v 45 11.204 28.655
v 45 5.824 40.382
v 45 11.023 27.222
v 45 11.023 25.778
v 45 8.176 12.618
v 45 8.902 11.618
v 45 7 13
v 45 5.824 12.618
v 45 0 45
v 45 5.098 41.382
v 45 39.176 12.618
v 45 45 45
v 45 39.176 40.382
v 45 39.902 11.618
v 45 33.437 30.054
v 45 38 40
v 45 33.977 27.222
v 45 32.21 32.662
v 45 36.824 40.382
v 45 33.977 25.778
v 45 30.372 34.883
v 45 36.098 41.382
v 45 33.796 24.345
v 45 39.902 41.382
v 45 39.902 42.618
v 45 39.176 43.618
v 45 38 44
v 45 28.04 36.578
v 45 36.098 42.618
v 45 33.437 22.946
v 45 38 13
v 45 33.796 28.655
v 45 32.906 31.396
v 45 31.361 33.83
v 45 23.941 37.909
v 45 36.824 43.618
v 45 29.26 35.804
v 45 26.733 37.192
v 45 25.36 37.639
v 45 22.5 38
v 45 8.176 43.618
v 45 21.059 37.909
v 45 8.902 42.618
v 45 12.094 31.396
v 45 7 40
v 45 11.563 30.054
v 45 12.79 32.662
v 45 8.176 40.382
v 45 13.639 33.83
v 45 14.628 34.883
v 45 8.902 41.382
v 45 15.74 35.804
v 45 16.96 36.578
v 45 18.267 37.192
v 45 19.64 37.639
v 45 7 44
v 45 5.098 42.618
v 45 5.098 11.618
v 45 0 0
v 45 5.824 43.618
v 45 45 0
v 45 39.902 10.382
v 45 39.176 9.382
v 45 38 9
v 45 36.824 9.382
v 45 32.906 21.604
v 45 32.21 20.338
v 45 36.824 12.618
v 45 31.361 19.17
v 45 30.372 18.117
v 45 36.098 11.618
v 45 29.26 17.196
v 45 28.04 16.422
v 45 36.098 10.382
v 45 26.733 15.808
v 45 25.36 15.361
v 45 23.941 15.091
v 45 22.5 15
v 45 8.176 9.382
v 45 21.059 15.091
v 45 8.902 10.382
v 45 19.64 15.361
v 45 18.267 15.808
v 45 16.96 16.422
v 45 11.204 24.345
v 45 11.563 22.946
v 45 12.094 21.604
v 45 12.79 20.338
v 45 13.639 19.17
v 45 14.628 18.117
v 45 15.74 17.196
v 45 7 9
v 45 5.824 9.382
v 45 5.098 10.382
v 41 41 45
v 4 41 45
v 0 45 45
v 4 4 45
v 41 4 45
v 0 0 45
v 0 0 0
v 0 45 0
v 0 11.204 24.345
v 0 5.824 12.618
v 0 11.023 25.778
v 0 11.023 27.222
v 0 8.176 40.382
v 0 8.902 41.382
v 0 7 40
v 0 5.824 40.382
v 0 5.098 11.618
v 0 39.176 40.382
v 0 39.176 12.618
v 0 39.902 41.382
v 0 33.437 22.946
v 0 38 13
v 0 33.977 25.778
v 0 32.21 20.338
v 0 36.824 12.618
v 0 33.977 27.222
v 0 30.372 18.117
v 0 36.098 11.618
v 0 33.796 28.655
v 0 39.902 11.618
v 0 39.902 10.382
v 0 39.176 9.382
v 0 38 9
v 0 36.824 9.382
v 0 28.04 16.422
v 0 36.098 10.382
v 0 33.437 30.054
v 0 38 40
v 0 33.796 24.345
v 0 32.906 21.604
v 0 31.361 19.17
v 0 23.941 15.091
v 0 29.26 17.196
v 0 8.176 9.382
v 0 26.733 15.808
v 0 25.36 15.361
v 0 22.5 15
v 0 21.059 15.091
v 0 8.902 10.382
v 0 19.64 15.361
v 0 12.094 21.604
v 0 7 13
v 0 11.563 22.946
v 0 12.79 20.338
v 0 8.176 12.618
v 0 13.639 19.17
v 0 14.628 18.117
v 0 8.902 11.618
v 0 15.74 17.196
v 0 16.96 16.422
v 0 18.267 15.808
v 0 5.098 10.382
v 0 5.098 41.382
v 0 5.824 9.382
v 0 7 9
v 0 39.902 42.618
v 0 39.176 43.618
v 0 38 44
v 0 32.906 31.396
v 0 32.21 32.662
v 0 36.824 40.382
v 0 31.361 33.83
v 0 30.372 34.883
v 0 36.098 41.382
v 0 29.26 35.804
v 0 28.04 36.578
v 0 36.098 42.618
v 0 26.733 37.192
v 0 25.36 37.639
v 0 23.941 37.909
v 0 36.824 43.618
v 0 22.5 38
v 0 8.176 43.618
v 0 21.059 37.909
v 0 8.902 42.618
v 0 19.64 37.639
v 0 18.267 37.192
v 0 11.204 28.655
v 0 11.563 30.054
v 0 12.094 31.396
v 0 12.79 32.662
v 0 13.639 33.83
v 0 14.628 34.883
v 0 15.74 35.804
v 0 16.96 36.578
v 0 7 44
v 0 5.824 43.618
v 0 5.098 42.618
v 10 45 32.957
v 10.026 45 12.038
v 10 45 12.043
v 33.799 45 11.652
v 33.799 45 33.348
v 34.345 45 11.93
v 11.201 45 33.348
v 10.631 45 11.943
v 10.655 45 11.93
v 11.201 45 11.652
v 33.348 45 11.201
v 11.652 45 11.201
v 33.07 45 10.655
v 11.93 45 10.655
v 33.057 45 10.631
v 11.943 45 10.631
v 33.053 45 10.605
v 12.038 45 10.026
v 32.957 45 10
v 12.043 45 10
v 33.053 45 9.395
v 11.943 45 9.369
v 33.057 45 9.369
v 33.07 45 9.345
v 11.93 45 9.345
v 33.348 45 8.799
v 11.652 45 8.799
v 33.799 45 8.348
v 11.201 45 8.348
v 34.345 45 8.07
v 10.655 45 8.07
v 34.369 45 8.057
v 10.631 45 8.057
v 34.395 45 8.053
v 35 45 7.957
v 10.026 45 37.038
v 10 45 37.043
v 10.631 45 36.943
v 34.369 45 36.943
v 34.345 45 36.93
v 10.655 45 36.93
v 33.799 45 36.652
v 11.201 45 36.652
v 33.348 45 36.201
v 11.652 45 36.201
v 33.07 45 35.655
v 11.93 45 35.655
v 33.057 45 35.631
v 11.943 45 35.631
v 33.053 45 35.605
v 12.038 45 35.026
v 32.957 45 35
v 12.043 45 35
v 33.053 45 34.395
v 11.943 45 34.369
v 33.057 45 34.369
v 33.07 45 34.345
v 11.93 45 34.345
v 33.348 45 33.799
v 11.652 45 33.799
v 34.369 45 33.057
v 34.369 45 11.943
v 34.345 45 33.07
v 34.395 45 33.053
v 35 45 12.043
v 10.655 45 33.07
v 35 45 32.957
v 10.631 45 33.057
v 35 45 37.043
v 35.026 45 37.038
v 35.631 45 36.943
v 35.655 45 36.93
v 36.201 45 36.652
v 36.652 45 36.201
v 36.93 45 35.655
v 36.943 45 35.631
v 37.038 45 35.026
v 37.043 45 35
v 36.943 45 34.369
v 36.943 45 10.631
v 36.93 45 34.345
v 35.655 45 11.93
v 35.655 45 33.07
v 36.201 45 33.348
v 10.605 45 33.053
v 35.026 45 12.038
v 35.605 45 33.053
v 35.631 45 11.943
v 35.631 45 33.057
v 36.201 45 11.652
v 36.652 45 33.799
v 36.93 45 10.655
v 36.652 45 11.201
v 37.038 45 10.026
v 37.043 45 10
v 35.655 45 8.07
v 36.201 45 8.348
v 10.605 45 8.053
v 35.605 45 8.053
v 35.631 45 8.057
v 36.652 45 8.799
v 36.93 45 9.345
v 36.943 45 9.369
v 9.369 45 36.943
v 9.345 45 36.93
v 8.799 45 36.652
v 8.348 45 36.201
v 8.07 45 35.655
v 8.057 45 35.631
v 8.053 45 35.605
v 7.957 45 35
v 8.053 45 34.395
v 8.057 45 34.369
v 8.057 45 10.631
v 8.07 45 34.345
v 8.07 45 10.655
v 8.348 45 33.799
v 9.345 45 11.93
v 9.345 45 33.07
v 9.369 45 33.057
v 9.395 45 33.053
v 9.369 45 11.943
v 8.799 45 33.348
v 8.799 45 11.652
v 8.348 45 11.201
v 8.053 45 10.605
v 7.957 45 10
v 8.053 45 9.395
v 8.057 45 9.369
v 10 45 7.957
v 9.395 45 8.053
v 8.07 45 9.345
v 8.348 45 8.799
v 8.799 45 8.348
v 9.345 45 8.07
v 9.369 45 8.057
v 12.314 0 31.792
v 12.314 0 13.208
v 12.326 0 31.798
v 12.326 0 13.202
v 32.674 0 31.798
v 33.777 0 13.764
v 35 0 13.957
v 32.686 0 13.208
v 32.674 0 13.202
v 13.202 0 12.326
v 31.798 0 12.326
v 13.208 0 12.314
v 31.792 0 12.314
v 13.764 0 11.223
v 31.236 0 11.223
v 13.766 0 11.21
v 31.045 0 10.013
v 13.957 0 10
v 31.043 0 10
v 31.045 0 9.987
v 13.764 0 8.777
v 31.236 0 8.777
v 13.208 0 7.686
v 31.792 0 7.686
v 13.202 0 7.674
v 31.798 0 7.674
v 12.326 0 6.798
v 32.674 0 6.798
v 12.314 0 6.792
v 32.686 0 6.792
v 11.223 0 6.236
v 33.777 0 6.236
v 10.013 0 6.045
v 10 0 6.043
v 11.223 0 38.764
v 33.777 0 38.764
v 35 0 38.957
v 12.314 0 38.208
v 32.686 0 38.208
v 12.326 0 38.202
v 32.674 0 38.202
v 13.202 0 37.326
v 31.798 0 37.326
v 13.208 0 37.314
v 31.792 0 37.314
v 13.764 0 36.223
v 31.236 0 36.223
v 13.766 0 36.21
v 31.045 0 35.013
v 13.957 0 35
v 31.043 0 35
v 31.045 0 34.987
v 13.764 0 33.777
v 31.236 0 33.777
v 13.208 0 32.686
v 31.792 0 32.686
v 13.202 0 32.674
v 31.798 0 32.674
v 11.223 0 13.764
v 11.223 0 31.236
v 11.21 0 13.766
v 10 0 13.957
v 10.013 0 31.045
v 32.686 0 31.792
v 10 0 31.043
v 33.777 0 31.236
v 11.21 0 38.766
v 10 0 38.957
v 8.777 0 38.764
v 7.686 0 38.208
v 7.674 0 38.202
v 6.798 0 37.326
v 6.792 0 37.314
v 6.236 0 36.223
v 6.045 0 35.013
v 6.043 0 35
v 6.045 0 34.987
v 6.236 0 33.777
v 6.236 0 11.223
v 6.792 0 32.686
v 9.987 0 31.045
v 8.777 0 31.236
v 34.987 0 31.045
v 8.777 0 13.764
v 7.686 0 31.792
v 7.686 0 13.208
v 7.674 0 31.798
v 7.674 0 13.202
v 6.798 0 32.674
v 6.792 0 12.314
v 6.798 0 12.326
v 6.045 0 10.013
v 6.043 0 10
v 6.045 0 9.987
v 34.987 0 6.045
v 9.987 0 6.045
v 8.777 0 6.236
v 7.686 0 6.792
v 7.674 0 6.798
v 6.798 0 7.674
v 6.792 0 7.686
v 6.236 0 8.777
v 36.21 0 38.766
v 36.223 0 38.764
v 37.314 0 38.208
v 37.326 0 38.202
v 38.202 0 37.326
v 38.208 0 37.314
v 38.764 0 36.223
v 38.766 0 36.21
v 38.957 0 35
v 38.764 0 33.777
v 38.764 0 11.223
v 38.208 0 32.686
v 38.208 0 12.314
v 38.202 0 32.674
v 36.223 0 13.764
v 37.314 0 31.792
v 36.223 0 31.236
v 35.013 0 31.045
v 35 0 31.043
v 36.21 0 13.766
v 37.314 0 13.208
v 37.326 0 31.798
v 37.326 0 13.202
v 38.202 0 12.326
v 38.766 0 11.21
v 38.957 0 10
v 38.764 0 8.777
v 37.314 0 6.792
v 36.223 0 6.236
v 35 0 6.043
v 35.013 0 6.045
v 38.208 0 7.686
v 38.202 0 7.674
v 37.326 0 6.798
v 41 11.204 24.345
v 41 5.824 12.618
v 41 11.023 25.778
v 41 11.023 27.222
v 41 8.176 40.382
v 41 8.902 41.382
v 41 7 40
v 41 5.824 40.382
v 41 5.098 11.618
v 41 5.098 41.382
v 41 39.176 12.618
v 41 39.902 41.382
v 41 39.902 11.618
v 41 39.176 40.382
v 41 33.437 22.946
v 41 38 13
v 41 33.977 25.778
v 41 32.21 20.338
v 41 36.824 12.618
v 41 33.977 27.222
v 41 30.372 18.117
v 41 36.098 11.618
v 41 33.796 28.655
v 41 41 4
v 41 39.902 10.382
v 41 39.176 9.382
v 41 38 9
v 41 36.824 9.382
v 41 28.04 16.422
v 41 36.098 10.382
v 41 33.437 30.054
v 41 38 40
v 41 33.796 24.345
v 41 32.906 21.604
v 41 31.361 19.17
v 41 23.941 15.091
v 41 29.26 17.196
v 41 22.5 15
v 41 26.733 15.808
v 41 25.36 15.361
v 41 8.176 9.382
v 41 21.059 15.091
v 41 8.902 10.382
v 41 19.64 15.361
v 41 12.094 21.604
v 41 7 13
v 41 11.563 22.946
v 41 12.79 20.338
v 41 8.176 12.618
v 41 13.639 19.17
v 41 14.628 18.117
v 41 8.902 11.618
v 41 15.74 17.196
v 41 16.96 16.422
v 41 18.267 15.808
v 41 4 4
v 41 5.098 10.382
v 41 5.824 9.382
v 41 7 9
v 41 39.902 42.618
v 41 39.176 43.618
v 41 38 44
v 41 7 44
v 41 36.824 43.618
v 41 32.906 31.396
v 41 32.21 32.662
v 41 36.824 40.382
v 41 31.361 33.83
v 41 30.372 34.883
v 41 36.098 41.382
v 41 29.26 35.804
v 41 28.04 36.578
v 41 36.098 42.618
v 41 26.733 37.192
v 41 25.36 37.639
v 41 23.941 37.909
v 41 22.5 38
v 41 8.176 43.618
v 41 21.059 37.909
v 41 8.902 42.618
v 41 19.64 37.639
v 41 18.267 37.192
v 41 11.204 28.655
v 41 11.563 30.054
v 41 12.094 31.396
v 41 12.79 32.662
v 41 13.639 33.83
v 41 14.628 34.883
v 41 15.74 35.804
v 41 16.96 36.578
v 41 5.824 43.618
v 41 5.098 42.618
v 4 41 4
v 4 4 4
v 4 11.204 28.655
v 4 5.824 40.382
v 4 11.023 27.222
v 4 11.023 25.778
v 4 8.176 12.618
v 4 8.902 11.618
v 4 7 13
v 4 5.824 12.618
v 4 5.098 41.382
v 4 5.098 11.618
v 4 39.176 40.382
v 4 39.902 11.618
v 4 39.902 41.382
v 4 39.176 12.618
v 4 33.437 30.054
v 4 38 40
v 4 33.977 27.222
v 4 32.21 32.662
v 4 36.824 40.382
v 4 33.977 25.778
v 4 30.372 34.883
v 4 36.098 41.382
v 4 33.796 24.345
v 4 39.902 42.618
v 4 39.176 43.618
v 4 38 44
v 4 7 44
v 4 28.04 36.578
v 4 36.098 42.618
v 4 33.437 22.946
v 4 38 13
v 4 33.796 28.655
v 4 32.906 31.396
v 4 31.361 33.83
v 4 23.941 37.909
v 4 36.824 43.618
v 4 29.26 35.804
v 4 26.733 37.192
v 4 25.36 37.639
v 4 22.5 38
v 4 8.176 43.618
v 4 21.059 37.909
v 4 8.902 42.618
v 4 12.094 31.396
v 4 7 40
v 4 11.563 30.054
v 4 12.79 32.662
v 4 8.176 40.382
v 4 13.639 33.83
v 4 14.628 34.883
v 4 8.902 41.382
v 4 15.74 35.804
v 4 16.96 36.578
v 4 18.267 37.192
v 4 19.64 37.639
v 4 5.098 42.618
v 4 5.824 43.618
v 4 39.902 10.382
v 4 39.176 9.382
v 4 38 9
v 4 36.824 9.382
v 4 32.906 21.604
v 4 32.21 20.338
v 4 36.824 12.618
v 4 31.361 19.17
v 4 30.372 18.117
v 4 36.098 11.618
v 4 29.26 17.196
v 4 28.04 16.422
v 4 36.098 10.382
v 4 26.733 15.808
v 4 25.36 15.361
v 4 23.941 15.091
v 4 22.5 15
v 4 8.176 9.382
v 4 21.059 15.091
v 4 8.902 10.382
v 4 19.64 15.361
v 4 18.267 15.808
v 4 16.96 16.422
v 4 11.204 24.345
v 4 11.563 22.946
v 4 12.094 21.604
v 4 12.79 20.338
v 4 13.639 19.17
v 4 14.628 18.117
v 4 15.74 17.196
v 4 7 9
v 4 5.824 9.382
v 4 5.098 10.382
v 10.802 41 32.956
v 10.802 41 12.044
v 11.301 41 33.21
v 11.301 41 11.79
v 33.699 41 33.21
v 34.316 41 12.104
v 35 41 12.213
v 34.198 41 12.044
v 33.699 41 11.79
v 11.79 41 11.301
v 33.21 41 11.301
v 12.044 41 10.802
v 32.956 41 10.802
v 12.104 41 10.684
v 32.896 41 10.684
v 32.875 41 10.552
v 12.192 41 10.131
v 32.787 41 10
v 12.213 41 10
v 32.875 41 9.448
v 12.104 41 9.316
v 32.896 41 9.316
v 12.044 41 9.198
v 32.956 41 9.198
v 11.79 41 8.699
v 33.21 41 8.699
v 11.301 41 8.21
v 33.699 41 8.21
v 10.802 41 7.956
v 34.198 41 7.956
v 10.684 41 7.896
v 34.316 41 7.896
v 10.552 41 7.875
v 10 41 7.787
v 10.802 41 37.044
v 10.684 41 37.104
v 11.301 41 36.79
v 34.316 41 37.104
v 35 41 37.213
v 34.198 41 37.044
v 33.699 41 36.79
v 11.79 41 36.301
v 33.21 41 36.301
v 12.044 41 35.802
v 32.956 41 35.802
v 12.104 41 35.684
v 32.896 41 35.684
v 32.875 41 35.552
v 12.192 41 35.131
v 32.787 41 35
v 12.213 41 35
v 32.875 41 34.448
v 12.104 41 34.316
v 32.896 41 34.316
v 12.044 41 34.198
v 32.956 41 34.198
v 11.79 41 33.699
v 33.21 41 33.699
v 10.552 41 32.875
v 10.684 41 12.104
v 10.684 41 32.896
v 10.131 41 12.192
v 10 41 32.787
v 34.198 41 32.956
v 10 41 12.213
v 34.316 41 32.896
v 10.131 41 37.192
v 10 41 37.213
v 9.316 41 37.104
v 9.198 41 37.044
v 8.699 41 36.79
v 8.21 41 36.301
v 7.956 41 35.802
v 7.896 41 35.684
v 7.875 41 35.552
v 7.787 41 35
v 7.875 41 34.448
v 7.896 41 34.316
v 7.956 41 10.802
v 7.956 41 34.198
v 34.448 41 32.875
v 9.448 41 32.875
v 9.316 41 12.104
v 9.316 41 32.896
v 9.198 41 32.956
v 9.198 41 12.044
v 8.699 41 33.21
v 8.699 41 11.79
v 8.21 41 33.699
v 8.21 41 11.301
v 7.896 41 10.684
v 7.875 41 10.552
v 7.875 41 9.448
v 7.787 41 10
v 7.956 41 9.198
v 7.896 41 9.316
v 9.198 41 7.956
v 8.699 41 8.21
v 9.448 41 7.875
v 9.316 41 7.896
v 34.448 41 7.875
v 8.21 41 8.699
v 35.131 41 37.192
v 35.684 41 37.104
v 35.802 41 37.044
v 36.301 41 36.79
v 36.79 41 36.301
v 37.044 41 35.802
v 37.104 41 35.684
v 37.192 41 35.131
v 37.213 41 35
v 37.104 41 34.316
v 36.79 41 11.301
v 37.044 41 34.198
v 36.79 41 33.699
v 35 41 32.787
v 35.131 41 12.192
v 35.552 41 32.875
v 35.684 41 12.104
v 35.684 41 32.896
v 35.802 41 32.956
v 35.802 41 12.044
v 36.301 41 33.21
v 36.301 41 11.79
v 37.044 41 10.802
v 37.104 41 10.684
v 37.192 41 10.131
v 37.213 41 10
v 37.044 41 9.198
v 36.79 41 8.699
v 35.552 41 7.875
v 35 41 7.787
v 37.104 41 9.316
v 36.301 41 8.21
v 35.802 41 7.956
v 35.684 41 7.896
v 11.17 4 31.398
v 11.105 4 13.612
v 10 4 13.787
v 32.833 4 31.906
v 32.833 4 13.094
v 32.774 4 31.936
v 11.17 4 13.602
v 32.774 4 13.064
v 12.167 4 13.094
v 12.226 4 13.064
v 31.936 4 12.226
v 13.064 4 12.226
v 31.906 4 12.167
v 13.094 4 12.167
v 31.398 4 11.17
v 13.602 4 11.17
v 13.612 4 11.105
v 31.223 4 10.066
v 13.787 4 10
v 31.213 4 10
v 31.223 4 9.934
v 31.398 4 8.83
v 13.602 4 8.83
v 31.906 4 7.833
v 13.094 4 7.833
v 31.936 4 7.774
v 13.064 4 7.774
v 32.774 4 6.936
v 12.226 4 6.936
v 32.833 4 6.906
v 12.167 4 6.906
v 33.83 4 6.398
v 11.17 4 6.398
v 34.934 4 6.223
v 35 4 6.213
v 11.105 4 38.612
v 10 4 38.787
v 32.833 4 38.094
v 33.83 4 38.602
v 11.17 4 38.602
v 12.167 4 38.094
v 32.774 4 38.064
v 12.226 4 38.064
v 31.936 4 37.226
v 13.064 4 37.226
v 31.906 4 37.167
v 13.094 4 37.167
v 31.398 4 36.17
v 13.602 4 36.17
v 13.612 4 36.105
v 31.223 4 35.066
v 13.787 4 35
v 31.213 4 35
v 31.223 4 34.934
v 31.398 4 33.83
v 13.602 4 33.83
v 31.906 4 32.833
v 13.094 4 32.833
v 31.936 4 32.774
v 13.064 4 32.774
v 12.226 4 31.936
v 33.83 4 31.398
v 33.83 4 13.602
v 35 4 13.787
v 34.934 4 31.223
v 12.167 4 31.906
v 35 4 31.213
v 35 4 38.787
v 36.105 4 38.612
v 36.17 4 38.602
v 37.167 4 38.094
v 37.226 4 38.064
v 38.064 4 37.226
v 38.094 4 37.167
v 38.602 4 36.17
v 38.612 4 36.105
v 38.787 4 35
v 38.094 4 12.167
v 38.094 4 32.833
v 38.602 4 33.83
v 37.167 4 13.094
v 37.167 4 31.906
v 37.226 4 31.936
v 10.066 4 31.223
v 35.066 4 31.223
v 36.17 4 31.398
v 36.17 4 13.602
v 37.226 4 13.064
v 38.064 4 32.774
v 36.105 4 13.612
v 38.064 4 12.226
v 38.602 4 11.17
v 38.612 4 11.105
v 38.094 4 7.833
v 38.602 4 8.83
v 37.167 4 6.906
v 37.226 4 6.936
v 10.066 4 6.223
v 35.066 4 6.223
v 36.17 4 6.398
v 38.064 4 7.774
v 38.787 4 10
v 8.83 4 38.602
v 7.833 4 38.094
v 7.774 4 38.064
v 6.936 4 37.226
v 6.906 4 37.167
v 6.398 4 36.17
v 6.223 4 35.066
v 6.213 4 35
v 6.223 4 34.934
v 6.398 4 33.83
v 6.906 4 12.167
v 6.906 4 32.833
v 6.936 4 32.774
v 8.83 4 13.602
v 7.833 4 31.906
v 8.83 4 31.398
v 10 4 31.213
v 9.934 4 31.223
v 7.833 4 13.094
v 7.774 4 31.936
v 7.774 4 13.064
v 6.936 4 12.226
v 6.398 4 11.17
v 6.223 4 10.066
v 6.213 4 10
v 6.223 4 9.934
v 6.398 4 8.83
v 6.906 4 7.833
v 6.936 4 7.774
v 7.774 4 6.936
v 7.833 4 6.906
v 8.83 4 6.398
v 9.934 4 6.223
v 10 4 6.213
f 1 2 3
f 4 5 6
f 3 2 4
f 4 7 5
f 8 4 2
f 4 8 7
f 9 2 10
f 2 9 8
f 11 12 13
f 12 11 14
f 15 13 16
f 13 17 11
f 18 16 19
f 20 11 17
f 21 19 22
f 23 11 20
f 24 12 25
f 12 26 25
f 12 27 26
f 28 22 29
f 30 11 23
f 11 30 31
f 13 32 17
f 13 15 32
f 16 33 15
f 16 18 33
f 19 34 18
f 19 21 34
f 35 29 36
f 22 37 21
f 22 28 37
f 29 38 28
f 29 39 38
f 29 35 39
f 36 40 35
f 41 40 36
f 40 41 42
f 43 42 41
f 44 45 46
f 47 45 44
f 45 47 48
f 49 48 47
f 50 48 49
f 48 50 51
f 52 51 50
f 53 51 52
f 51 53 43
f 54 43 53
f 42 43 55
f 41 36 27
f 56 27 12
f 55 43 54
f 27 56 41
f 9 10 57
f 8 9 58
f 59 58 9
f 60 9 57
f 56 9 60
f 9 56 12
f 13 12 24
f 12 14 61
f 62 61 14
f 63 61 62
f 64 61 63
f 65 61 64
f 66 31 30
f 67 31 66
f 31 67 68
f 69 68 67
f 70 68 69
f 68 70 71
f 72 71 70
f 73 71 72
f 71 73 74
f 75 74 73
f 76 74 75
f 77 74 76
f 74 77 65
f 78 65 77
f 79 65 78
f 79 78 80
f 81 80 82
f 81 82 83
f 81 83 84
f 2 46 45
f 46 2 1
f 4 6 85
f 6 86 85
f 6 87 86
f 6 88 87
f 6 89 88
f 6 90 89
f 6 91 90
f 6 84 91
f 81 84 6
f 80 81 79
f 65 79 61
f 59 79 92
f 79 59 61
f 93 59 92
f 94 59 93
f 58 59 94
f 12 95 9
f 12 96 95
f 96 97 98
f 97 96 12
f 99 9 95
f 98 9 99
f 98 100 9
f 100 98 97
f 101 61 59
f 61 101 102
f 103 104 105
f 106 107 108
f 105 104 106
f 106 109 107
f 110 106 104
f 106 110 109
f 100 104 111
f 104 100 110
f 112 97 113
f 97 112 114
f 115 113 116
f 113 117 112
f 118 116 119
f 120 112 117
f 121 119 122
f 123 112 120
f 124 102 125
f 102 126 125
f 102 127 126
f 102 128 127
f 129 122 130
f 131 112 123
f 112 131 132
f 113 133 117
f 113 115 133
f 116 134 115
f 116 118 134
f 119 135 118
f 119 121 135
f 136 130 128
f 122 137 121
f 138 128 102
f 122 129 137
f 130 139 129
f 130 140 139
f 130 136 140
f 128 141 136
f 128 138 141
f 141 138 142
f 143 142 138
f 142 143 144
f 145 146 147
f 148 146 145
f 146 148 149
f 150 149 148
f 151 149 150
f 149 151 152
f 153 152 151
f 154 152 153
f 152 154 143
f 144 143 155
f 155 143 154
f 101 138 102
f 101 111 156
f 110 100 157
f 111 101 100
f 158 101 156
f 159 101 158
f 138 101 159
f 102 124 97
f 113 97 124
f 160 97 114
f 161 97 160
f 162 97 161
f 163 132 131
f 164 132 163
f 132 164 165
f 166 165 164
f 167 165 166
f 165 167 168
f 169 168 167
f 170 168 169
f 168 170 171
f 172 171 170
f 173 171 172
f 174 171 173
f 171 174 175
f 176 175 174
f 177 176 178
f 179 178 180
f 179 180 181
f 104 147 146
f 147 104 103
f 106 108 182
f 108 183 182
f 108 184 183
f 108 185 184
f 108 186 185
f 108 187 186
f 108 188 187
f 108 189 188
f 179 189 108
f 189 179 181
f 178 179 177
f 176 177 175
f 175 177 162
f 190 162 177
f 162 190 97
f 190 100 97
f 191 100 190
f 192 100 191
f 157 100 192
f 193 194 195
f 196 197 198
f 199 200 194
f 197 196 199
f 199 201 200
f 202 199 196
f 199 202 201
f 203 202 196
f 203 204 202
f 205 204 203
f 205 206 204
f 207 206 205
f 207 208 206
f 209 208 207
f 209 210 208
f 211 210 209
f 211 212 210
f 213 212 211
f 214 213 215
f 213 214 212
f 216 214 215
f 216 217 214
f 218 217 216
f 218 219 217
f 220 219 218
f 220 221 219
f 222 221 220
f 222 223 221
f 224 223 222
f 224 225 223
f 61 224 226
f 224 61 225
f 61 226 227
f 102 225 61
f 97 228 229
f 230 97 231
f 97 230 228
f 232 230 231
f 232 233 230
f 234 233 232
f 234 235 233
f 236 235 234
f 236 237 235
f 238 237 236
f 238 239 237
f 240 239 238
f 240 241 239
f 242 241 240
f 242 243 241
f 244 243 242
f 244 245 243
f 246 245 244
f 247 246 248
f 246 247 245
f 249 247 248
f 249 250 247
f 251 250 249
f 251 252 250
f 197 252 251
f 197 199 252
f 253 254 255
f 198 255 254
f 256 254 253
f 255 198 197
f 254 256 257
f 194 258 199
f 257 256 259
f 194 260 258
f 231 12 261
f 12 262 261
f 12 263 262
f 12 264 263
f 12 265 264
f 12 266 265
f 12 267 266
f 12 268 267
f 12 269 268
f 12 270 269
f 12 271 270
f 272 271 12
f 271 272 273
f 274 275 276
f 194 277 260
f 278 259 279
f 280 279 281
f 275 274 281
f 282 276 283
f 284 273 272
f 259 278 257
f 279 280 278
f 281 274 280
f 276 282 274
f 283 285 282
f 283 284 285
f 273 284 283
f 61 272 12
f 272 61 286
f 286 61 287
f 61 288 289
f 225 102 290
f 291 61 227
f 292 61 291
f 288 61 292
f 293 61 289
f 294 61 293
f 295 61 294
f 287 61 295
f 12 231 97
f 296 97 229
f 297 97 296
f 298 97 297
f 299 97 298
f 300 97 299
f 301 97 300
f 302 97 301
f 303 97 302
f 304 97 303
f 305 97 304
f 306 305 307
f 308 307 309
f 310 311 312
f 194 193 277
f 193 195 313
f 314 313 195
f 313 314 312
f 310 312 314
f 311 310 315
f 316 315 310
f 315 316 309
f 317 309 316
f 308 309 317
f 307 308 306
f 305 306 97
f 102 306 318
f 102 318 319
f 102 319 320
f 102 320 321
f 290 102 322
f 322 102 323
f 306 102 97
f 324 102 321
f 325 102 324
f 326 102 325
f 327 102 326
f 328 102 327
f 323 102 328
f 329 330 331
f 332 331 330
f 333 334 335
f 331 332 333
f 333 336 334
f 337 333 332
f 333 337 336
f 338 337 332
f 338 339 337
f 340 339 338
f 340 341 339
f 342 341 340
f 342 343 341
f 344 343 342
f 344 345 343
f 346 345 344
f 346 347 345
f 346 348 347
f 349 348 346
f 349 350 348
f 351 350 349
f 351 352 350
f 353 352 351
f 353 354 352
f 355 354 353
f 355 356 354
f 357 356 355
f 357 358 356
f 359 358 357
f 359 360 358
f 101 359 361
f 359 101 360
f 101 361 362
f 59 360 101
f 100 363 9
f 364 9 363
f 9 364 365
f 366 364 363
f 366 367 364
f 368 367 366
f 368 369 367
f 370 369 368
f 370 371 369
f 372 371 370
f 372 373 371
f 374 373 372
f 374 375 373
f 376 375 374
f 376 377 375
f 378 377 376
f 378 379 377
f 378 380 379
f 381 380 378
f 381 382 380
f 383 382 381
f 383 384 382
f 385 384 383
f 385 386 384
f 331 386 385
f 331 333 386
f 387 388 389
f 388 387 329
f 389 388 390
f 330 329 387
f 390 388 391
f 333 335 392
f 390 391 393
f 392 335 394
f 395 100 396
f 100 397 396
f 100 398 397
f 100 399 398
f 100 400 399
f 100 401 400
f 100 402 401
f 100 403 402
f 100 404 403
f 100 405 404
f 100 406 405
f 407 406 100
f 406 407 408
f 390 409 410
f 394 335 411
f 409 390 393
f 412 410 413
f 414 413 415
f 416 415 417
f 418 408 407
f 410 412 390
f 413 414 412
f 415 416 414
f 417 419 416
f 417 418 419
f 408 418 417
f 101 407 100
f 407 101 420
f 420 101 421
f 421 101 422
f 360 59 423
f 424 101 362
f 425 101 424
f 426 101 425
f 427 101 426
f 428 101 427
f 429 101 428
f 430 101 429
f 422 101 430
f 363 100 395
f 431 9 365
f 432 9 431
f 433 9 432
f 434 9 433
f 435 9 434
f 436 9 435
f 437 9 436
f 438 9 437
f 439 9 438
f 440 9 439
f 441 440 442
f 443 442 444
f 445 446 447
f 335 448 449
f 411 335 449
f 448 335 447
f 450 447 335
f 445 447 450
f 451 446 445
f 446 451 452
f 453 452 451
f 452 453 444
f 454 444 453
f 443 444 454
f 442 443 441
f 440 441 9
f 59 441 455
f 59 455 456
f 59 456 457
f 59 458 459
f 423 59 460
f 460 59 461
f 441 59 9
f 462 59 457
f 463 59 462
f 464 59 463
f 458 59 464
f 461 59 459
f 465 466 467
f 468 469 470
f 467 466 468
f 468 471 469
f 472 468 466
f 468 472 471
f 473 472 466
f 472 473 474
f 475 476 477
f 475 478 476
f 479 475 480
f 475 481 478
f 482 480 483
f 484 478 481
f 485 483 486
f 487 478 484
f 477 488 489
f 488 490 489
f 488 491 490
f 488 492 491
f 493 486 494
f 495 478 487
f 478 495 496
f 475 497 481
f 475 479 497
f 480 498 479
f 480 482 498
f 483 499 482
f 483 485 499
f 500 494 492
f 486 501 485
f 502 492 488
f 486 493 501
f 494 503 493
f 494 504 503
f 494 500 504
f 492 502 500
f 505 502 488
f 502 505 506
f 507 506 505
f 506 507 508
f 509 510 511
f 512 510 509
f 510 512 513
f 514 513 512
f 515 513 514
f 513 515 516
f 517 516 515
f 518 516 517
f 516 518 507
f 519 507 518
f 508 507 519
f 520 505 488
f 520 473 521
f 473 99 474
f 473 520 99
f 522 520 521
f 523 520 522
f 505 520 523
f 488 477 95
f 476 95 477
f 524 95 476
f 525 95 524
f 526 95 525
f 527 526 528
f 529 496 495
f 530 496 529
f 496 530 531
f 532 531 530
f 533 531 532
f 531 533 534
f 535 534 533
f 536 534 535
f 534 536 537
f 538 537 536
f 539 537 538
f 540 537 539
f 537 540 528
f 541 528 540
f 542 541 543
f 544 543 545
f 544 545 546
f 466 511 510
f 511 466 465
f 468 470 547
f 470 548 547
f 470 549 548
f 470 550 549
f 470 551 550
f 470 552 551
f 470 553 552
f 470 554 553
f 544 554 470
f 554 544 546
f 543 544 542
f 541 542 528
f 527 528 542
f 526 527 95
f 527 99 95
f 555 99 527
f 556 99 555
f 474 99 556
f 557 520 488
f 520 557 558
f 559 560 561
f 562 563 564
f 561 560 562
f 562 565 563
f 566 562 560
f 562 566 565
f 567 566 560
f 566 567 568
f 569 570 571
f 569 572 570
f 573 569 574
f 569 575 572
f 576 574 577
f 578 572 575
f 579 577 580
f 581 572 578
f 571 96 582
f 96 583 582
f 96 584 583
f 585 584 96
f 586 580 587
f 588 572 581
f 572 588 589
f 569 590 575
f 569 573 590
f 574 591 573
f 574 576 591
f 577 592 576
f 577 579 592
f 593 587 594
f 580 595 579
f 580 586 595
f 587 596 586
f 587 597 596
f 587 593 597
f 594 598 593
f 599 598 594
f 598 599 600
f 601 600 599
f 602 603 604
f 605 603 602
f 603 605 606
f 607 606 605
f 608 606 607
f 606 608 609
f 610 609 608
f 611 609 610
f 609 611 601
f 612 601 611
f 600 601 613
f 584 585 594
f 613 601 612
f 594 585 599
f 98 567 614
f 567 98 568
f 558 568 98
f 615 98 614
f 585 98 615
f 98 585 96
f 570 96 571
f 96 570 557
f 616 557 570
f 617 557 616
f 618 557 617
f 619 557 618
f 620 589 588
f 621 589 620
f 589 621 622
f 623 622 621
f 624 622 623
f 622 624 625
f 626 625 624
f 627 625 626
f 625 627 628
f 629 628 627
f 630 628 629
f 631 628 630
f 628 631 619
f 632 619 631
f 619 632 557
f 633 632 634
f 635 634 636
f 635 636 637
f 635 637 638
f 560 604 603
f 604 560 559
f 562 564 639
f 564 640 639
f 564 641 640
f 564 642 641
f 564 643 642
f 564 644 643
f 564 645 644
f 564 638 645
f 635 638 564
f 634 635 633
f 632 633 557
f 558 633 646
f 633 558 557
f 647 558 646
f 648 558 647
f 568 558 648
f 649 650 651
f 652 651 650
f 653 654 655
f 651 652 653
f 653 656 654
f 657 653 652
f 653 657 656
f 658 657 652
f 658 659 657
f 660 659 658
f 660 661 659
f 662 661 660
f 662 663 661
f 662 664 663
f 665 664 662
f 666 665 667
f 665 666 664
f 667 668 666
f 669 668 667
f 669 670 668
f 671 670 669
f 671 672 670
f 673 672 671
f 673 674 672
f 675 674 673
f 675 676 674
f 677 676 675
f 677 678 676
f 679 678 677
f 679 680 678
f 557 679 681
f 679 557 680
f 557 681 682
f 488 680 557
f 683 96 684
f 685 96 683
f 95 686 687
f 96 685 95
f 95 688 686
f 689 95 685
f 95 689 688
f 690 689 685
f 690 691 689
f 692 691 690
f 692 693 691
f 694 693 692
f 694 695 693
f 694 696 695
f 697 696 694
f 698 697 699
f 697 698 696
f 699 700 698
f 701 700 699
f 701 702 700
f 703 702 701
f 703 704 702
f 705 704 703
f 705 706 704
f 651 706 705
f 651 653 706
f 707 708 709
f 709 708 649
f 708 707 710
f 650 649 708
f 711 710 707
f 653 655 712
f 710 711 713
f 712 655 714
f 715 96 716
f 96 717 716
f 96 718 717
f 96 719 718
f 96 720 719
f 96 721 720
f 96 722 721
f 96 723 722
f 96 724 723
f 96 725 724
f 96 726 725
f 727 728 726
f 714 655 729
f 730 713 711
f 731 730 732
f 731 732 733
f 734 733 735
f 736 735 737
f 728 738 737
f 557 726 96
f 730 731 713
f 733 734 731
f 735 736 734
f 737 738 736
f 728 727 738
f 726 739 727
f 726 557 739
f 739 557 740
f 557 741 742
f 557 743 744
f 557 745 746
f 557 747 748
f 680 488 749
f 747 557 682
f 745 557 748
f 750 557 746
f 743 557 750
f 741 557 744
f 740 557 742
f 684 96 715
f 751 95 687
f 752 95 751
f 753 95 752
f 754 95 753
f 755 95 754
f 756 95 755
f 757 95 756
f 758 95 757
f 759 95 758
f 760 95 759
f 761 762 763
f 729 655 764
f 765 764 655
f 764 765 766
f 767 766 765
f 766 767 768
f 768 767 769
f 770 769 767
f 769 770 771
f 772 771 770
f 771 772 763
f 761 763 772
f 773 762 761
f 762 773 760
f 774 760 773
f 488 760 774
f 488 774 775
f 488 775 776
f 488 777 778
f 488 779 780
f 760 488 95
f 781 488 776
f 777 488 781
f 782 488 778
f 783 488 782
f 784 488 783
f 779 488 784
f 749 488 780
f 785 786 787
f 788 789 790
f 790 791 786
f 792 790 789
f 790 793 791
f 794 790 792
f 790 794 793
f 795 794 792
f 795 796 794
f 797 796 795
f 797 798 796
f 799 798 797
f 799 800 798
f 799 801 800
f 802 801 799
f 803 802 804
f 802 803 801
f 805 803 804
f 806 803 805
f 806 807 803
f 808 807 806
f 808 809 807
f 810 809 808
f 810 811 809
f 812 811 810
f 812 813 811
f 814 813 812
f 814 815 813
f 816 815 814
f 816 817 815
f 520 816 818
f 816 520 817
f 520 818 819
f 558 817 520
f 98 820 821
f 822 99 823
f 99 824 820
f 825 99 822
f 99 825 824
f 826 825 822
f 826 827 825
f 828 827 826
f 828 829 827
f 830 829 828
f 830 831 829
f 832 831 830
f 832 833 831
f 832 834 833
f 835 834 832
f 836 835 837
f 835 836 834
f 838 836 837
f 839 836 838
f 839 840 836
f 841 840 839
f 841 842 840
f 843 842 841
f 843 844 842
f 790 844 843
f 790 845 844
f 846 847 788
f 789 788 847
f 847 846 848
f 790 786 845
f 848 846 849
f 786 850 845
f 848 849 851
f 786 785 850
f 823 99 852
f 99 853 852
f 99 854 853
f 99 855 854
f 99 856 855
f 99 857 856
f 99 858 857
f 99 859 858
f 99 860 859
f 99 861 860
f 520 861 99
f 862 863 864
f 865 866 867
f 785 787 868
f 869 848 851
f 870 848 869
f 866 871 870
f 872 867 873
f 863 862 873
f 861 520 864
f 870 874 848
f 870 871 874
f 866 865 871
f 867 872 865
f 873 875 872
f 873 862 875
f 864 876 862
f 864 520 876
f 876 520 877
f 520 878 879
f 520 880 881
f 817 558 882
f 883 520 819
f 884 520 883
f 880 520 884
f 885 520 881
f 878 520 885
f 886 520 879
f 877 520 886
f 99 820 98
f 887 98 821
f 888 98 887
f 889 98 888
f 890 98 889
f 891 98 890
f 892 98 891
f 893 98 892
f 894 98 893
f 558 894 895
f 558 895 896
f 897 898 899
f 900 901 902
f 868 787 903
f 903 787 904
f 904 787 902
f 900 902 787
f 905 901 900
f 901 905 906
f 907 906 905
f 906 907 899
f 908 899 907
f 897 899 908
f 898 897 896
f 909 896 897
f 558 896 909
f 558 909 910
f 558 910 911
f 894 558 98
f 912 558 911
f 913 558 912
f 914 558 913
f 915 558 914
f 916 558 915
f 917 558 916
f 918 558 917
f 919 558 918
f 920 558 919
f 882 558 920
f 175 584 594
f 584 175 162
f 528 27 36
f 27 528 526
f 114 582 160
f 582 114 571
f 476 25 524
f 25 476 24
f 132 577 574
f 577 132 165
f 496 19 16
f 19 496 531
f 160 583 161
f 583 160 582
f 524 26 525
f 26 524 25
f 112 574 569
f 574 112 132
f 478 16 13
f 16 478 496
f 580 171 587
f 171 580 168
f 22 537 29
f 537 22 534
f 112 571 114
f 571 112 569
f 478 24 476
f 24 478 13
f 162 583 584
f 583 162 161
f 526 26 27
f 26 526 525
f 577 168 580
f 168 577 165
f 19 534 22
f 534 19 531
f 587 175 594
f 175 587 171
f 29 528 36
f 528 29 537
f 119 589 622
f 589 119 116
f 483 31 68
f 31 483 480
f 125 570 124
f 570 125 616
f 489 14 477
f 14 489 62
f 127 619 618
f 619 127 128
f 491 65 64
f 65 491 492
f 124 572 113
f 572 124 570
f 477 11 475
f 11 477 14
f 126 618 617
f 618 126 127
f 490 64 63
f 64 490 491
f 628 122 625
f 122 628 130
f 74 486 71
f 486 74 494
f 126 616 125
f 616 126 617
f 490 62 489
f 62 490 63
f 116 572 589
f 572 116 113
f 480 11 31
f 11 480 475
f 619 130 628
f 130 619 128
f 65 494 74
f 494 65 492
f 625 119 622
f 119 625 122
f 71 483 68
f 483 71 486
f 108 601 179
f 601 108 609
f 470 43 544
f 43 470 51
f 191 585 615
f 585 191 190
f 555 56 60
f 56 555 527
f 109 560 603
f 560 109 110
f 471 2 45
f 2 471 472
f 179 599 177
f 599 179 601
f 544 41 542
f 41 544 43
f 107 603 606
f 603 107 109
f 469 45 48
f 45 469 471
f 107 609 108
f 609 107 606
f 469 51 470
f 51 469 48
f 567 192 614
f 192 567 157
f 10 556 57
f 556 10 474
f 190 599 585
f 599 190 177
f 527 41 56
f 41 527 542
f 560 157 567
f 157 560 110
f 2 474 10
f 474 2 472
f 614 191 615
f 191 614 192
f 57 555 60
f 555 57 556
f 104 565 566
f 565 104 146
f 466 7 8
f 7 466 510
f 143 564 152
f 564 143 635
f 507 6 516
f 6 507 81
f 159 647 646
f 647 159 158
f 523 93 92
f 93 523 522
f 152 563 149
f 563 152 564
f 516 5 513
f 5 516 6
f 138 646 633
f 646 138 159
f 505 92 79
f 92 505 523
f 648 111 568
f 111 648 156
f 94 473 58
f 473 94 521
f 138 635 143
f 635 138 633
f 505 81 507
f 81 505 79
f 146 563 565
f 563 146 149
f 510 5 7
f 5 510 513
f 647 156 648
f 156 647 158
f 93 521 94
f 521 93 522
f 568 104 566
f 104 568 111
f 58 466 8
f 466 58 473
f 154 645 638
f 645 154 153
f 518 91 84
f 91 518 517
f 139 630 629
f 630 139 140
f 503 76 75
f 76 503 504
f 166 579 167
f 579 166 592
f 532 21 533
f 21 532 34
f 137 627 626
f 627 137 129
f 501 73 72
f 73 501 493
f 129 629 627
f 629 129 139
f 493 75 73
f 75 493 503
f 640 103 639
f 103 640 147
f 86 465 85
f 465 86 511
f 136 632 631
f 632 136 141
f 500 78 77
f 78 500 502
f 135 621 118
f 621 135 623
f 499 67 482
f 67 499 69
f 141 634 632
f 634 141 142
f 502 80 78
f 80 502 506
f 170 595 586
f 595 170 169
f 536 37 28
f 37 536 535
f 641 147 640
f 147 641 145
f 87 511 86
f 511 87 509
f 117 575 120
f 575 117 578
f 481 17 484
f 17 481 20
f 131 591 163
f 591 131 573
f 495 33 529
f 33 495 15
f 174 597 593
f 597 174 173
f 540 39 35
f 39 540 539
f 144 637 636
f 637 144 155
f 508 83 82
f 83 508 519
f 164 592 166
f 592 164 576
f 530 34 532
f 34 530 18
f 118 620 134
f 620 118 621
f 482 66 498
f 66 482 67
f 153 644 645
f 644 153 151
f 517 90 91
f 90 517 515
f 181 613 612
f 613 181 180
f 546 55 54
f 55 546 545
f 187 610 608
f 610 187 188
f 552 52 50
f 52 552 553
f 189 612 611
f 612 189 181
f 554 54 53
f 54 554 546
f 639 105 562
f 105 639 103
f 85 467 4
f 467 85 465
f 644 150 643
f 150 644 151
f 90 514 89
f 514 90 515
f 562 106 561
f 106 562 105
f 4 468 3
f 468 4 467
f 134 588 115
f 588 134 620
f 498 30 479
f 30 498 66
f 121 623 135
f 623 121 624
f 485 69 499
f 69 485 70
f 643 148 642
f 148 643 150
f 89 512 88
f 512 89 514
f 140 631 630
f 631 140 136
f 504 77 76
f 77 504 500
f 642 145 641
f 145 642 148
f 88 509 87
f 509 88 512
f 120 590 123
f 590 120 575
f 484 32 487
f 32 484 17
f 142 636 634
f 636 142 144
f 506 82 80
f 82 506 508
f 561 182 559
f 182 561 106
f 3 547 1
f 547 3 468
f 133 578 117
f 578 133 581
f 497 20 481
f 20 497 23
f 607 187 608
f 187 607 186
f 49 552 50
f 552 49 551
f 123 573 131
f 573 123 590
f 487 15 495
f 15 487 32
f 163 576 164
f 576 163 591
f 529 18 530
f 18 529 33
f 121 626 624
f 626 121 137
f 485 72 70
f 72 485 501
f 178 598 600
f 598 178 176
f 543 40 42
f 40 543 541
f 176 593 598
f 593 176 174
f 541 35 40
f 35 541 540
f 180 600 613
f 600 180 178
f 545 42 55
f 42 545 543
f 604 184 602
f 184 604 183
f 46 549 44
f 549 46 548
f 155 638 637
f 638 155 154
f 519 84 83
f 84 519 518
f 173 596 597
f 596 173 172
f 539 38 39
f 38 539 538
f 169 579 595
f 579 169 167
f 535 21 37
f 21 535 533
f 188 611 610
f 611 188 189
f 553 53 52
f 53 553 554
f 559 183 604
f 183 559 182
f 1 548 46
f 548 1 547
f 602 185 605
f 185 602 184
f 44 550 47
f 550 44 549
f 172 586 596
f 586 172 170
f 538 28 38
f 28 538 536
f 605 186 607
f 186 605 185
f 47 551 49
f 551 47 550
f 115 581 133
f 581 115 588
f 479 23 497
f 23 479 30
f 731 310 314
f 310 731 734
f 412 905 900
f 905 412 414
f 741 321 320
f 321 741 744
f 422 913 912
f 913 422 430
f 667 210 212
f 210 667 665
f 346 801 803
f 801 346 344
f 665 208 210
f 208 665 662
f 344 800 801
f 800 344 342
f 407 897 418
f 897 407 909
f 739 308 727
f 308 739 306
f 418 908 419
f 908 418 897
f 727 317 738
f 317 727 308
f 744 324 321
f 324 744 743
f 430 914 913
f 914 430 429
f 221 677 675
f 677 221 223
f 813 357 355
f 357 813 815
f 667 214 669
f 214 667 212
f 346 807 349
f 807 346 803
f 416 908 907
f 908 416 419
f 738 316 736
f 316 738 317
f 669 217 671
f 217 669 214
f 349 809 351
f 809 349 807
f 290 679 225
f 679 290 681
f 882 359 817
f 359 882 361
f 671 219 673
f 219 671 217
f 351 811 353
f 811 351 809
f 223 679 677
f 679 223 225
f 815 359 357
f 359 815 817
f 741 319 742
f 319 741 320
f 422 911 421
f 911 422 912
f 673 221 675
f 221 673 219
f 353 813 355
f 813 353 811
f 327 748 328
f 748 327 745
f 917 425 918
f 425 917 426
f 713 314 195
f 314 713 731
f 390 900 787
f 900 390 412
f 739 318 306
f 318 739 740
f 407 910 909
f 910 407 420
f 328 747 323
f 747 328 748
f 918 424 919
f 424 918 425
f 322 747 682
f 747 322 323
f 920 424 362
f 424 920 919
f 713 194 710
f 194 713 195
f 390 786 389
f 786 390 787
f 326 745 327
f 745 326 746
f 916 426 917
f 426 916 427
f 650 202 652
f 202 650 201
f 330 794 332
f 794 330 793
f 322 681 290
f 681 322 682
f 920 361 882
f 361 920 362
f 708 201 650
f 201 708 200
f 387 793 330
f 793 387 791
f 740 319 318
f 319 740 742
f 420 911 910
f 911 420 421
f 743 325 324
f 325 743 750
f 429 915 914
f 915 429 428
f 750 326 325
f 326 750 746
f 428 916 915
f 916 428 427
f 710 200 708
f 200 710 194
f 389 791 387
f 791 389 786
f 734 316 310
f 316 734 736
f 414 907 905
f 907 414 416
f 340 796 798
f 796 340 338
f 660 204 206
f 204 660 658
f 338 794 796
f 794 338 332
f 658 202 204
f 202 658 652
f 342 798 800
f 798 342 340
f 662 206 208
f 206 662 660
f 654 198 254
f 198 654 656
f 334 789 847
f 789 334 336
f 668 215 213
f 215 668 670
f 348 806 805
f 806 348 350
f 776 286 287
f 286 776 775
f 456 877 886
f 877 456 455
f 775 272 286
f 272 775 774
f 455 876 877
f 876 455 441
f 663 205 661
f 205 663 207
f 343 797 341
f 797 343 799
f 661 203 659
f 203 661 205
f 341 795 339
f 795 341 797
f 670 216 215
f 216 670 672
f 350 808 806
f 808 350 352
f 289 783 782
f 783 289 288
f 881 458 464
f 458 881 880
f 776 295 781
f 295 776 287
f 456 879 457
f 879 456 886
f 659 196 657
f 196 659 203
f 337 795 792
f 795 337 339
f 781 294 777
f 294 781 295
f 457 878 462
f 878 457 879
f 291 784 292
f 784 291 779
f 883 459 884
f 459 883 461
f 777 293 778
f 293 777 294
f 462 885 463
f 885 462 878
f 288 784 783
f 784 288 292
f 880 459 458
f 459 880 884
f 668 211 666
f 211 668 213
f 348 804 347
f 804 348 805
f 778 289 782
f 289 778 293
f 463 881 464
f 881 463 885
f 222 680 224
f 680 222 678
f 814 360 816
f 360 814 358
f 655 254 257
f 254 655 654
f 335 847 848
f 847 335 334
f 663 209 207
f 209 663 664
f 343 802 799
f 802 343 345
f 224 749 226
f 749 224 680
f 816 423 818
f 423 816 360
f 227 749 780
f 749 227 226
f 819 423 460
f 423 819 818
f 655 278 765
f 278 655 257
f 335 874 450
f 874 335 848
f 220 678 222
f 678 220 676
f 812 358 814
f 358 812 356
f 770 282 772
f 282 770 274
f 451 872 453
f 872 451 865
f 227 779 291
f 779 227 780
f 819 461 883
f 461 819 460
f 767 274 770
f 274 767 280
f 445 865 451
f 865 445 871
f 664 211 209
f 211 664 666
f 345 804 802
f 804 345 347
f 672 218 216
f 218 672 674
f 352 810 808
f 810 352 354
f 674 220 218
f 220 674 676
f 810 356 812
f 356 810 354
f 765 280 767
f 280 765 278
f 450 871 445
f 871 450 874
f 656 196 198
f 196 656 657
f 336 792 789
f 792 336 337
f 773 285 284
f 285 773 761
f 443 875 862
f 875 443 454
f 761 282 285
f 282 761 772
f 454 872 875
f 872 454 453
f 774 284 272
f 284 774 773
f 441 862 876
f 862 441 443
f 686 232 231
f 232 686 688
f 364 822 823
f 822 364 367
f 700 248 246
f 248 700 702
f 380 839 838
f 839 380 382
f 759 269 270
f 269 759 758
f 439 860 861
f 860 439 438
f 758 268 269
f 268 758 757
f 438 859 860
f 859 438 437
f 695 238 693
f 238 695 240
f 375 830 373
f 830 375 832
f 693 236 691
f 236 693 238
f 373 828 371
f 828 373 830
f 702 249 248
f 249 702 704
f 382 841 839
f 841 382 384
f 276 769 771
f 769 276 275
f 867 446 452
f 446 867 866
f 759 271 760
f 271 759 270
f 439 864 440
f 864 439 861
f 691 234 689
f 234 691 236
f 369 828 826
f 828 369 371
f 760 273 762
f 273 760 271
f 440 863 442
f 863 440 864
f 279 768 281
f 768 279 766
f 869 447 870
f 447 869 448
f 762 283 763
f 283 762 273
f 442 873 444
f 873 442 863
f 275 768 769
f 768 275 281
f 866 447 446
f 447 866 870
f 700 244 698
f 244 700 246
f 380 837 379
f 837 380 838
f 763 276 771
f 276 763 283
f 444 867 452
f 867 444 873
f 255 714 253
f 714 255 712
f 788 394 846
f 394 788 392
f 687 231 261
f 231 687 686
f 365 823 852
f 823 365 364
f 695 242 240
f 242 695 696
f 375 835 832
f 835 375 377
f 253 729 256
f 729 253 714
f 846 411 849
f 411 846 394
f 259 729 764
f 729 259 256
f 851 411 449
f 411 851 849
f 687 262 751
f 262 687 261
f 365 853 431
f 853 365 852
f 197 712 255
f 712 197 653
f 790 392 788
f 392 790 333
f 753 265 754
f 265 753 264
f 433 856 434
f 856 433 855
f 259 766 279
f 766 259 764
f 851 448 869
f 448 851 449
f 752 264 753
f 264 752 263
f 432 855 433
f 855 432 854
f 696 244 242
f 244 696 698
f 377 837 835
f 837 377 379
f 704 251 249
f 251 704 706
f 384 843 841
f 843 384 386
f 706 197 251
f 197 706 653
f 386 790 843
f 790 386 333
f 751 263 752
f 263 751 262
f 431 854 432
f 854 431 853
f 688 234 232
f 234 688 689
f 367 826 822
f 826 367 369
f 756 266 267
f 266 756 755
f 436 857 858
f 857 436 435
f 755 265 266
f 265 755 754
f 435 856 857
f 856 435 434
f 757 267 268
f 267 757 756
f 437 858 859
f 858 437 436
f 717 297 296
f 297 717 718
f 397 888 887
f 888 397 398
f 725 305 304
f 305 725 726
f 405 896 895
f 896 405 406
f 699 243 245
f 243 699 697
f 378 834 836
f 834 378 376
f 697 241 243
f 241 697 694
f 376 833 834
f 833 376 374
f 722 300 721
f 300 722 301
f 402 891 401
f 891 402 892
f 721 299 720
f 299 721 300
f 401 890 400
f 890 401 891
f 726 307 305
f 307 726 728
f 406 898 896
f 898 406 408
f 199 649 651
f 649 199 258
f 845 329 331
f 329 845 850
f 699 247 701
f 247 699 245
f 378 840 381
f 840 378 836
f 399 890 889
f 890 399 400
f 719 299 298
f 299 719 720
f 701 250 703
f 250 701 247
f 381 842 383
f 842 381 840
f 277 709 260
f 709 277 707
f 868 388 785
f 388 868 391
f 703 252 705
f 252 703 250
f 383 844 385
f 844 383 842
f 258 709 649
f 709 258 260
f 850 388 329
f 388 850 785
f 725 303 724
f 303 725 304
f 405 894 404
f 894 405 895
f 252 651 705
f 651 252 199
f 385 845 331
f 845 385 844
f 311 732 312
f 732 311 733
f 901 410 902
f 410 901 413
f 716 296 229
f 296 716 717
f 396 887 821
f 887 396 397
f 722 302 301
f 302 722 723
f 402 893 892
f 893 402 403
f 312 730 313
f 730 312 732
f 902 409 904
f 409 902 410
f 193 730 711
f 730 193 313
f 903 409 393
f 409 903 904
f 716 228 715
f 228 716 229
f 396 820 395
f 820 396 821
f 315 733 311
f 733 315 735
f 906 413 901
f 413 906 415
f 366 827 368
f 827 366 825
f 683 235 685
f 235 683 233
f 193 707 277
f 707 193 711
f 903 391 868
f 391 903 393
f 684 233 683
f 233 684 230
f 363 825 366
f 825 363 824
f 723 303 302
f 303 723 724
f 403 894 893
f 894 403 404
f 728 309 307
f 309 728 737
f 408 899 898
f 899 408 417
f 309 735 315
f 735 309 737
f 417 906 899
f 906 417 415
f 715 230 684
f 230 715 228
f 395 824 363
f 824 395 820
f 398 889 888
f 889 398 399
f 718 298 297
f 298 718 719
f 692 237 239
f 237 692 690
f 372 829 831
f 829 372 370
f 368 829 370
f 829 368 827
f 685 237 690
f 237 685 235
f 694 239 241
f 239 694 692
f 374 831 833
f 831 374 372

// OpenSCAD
/* 
Marten Vijn 2014
dual licensed 
A. Beer license (buy me a beer)
and
B. http://svn.martenvijn.nl/svn/LICENSE

*/




hi=45;

di=8;

sph=hi/2+di/2;
spb=hi/2;
m=31/2;

module box(){
		difference(){
			cube([hi,hi,hi]);
			translate([di/2,di/2,di/2]) cube([hi-di,hi-di,hi]);
			translate([-1,spb+m,sph+m])  rotate([0,90,0])cylinder(r=2,h=hi+2,$fn=10);
			translate([-1,spb+m,sph-m]) rotate([0,90,0])cylinder(r=2,h=hi+2,$fn=10);
			translate([-1,spb-m,sph+m]) rotate([0,90,0])cylinder(r=2,h=hi+2,$fn=10);	
			translate([-1,spb-m,sph-m]) rotate([0,90,0])cylinder(r=2,h=hi+2,$fn=10);
		
			translate([-1,spb,sph]) rotate([0,90,0])cylinder(r=11.5,h=hi+2,$fn=50);


			translate([10,hi+1,10])  rotate([90,0,0])cylinder(r=2,r2=4,hi+2,$fn=20);
			translate([hi-10,hi+1,10])  rotate([90,0,0])cylinder(r=2,r2=4,hi+2,$fn=20);	
			translate([hi-10,hi+1,hi-10])  rotate([90,0,0])cylinder(r=2,r2=4,hi+2,$fn=20);
			translate([10,hi+1,hi-10])  rotate([90,0,0])cylinder(r=2,r2=4,hi+2,$fn=20);
			}
		}



module spool(){
	difference(){
		union(){
			cylinder(r1=10,r2=8,h=20,$fn=20);
			translate([0,0,20]) cylinder(r1=8,r2=10,h=20,$fn=20);

			}
		translate([0,0,-1])cylinder(r=2.5,h=42,$fn=20);
		rotate([0,90,0]) translate([-7,0,0])cylinder(r=2.5,h=15,$fn=10);
		rotate([0,90,0]) translate([-37,0,0])cylinder(r=1.5,h=15,$fn=10);
		translate([4,0,39]) cube([2,6,10],center=true);
		}
	}

//spool();
box();
